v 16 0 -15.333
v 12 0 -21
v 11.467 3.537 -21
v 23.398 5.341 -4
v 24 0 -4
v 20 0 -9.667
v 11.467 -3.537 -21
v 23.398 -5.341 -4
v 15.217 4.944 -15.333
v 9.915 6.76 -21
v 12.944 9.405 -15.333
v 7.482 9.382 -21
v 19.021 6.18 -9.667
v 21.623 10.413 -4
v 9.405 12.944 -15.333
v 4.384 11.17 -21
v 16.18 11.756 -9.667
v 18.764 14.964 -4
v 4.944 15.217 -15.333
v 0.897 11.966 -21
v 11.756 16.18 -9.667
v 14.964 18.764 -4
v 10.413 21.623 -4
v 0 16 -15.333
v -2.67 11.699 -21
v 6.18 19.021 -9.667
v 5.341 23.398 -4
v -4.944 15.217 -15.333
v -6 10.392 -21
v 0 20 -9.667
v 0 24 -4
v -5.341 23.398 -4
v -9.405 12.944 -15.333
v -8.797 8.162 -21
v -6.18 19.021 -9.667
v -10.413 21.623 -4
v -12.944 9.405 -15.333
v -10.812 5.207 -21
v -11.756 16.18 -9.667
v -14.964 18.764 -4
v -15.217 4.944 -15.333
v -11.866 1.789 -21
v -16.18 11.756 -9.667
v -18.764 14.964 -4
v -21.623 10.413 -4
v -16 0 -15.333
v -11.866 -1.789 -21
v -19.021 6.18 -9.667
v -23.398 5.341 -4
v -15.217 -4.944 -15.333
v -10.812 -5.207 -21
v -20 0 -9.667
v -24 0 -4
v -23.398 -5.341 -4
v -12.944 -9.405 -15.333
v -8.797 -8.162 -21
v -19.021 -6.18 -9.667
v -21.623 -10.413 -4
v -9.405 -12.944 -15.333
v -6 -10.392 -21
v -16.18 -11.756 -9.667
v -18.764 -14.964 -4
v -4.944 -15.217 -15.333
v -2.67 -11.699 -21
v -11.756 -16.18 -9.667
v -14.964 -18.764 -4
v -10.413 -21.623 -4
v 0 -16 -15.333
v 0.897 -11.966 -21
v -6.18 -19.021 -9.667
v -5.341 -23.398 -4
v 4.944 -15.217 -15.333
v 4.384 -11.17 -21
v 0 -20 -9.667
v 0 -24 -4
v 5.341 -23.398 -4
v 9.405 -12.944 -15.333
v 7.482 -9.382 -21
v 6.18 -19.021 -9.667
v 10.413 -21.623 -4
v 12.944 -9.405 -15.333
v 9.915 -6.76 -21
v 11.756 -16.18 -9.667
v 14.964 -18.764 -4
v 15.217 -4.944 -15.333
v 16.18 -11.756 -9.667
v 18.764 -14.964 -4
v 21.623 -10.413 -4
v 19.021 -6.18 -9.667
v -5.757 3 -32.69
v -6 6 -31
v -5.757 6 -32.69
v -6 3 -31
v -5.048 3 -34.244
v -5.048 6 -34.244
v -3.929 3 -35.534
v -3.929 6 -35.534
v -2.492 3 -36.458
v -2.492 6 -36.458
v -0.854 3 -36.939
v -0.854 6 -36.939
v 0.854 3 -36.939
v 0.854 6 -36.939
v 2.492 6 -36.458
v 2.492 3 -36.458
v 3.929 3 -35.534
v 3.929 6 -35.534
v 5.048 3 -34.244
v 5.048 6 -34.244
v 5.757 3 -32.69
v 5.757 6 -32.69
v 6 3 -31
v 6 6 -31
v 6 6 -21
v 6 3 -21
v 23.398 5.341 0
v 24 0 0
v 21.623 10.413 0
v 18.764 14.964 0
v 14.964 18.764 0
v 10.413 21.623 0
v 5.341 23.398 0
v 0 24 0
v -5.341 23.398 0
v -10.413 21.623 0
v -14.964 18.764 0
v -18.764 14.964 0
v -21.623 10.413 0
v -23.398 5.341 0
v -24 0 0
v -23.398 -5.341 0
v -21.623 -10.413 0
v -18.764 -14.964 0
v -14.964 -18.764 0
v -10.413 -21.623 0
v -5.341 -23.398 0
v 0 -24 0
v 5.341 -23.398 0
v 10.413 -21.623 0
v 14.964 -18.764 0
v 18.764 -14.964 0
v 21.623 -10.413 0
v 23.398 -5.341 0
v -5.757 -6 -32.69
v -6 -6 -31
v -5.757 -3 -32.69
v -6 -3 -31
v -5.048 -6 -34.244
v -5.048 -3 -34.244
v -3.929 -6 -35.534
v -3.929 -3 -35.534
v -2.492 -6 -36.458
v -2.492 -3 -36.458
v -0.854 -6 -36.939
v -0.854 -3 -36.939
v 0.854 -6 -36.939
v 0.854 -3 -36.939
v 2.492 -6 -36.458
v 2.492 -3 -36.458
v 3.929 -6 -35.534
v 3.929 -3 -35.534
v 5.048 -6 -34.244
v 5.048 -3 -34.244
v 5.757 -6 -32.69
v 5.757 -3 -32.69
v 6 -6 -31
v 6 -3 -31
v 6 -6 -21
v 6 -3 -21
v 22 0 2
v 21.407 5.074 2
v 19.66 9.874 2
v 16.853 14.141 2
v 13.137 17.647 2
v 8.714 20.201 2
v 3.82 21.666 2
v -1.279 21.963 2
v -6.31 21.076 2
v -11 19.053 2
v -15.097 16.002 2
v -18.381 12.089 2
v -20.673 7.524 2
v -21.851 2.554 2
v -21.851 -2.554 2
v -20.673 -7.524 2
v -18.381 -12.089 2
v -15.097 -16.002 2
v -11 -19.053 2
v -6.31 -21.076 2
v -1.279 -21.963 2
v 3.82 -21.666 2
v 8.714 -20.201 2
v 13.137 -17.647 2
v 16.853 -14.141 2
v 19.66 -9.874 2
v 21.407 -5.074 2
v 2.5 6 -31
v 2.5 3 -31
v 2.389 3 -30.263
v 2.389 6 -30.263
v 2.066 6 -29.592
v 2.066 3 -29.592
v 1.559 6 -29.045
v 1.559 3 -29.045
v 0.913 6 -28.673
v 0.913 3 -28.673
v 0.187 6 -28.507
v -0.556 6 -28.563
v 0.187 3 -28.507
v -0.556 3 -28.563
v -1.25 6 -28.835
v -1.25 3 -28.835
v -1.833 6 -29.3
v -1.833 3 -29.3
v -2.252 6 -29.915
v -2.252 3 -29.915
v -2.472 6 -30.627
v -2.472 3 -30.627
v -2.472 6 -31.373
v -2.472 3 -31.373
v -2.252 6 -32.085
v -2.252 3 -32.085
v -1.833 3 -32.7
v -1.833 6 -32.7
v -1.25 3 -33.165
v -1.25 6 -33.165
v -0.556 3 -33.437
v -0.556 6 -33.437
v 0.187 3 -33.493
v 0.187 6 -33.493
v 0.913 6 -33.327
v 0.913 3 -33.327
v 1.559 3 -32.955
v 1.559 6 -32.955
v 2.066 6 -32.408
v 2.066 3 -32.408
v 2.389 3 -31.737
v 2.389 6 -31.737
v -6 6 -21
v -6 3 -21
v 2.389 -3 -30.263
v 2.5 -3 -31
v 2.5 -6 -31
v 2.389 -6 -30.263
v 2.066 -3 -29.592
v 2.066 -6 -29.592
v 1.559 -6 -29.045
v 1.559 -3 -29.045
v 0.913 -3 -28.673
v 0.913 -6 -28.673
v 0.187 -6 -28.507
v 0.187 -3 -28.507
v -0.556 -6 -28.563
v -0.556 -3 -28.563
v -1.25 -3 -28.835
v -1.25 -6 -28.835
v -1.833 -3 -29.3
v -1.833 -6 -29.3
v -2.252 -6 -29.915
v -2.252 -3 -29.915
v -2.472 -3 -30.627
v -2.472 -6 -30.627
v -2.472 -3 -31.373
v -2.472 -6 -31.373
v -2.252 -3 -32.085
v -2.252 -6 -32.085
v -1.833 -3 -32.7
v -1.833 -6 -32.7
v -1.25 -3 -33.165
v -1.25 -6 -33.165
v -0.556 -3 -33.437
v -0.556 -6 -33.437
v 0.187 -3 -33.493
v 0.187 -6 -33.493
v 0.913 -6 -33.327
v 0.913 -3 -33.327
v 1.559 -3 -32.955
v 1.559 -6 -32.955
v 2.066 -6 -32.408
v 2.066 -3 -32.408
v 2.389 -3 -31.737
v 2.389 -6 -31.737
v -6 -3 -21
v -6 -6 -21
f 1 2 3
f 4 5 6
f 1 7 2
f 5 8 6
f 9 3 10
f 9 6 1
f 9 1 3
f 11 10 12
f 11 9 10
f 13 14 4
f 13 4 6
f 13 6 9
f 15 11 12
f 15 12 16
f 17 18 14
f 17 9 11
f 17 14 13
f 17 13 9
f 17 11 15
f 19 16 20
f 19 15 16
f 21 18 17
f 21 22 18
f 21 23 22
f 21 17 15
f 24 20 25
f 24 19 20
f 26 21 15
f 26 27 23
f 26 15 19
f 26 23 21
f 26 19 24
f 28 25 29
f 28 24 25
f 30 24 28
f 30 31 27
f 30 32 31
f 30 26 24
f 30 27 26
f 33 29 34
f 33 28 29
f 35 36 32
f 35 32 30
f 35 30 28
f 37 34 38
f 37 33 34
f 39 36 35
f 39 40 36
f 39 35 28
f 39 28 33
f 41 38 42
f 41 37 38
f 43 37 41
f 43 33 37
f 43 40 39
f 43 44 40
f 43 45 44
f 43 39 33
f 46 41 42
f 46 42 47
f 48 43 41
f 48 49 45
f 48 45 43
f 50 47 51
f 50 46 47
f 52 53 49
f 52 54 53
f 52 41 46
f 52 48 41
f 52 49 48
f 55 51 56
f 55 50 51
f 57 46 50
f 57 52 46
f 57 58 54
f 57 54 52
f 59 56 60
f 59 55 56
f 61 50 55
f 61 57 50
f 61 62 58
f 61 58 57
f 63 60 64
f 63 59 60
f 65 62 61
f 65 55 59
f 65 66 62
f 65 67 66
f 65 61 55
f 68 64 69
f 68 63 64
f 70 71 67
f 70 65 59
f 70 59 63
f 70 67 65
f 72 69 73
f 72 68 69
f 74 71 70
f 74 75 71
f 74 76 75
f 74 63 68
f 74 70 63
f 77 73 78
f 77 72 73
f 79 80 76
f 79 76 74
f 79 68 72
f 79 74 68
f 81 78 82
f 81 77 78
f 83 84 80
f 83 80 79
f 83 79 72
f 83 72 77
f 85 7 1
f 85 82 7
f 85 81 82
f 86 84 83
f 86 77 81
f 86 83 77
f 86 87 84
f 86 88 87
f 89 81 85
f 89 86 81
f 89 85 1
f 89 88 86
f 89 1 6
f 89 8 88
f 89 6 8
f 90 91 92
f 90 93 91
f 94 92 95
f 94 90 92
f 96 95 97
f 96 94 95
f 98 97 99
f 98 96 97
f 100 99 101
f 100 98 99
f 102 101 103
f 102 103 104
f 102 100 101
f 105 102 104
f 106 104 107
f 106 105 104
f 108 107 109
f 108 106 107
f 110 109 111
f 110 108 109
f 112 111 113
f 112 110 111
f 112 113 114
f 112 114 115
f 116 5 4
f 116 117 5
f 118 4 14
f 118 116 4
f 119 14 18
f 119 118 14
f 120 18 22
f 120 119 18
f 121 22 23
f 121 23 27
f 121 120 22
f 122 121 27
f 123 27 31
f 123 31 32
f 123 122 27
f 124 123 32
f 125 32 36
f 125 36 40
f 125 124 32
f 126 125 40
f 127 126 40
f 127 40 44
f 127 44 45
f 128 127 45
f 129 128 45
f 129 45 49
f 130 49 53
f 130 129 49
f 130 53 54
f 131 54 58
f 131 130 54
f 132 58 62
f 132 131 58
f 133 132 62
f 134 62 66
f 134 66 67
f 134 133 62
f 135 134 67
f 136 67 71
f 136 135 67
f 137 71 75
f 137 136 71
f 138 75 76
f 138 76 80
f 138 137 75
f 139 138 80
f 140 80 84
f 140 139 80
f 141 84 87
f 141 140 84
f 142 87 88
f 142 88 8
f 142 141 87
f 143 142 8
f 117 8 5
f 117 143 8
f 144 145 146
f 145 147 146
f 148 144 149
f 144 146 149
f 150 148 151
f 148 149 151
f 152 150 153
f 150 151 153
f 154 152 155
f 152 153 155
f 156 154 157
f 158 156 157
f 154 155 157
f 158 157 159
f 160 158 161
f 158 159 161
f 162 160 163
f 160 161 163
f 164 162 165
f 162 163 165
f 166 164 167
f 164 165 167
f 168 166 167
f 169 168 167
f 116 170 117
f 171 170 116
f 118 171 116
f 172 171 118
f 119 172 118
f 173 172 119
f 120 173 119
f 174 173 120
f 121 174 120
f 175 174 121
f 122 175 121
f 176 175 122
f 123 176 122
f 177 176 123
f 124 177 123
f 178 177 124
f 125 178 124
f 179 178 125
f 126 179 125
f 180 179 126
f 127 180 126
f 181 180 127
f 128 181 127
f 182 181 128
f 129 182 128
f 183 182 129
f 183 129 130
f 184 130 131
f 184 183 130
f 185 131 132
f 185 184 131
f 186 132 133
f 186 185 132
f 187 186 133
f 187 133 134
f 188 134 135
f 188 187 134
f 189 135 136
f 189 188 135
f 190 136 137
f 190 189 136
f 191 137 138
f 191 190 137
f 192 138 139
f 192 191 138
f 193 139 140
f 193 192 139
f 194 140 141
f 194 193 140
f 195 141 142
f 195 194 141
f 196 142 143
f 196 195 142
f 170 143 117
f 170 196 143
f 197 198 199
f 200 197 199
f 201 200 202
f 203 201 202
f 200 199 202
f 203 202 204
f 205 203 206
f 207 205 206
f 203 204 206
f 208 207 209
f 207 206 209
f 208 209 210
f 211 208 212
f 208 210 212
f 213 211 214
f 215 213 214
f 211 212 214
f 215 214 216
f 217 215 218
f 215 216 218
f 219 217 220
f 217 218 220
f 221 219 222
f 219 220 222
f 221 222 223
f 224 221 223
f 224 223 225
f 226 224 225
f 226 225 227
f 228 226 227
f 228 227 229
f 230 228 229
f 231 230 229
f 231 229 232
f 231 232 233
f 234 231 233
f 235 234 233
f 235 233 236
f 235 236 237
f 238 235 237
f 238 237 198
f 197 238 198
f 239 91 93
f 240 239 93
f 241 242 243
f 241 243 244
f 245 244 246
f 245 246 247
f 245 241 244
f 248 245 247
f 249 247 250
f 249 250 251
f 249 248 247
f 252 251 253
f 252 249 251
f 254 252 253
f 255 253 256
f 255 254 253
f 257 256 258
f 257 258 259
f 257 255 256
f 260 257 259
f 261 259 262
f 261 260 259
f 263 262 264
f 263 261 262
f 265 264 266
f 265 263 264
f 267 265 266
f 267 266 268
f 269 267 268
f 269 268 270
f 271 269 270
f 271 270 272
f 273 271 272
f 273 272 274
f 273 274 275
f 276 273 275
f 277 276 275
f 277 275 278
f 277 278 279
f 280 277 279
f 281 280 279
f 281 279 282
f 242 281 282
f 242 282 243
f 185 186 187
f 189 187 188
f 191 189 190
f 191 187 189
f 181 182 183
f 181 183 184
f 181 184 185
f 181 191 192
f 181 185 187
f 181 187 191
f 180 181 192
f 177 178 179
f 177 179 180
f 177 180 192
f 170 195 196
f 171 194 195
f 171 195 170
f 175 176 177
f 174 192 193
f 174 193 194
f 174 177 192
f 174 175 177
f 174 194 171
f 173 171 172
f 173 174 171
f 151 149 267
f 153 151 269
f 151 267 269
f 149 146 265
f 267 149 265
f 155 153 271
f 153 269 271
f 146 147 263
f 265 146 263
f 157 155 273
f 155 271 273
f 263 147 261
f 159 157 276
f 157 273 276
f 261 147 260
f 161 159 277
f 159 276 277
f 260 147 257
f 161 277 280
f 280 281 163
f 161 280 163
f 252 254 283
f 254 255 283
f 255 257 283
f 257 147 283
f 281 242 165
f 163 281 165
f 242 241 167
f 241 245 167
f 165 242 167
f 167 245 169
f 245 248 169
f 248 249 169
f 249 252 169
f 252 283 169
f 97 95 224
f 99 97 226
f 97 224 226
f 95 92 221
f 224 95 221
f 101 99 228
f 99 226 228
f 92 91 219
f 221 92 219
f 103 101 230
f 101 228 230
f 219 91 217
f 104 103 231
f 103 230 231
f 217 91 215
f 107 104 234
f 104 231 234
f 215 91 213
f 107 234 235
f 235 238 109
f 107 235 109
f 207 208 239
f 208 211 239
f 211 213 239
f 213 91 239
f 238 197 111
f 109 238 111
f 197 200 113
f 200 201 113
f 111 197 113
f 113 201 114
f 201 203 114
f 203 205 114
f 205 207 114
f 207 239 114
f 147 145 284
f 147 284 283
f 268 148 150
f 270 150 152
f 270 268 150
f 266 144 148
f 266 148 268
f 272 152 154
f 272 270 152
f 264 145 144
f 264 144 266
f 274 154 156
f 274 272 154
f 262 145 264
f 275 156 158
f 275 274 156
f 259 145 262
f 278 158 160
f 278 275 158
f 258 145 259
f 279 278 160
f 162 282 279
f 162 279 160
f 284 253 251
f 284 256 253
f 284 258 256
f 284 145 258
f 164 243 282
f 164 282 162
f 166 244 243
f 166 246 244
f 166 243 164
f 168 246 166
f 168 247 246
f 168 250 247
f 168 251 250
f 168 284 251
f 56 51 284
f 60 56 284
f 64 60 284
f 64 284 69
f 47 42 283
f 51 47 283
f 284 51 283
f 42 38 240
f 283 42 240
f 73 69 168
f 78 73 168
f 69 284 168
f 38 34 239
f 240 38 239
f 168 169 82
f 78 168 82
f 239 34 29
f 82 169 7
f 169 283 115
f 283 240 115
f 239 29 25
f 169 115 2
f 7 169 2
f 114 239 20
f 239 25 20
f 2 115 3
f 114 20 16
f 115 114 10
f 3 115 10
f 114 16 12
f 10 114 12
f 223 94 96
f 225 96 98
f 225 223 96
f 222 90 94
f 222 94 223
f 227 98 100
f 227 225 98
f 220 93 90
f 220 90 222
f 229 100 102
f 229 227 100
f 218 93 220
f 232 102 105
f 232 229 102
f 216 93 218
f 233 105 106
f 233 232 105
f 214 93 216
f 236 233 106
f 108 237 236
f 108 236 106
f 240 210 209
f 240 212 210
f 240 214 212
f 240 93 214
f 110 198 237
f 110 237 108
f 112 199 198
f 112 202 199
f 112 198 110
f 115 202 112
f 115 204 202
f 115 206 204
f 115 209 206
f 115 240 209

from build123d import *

# Parameters (mm, degrees)
F6_R      = 12
F4_R      = 24
F7_FACE_R = 24
F5_R      = 24
F8_FACE_R = 24
F3_R      = 22
F10_W     = 12
F10_H     = 3
F11_DEPTH = 10
F12_R     = 6
F13_DEPTH = 3
F14_R     = 2.5
F15_DEPTH = 21.0010001


with BuildPart() as f7:
    # F6 (on offset) → F7 section 0
    with BuildSketch(Plane.XY.offset(-21)):
        Circle(F6_R)
    # F4 (on offset) → F7 section 1
    with BuildSketch(Plane.XY.offset(-4)):
        Circle(F4_R)
    loft()

    # F7_face (on face) → F8 section 0
    with BuildSketch(Plane.XY.offset(-4)):
        Circle(F7_FACE_R)
    # F5 (on Top) → F8 section 1
    with BuildSketch(Plane.XY):
        Circle(F5_R)
    loft()

    # F8_face (on face) → F9 section 0
    with BuildSketch(Plane.XY):
        Circle(F8_FACE_R)
    # F3 (on offset) → F9 section 1
    with BuildSketch(Plane.XY.offset(2)):
        Circle(F3_R)
    loft()

    # F10 (on face) → F11 (join)
    with BuildSketch(Plane(origin=(0, 0, -21), x_dir=(1, 0, 0), z_dir=(0, 0, -1))):
        with Locations((0, -4.5)):
            Rectangle(F10_W, F10_H)
    extrude(amount=F11_DEPTH)

    # F12 (on face) → F13 (join)
    with BuildSketch(Plane.XZ.offset(-3)):
        with Locations((0, -31)):
            Circle(F12_R)
    extrude(amount=-F13_DEPTH)

    # F14 (on face) → F15 (cut, through all)
    with BuildSketch(Plane.XZ.offset(-3)):
        with Locations((0, -31)):
            Circle(F14_R)
    extrude(amount=-F15_DEPTH, mode=Mode.SUBTRACT)

    # F16: F7 across plane


with BuildPart() as f7_1:
    add(f7.part)
    add(f7.part.mirror(Plane.XZ))


solid = f7_1.part
